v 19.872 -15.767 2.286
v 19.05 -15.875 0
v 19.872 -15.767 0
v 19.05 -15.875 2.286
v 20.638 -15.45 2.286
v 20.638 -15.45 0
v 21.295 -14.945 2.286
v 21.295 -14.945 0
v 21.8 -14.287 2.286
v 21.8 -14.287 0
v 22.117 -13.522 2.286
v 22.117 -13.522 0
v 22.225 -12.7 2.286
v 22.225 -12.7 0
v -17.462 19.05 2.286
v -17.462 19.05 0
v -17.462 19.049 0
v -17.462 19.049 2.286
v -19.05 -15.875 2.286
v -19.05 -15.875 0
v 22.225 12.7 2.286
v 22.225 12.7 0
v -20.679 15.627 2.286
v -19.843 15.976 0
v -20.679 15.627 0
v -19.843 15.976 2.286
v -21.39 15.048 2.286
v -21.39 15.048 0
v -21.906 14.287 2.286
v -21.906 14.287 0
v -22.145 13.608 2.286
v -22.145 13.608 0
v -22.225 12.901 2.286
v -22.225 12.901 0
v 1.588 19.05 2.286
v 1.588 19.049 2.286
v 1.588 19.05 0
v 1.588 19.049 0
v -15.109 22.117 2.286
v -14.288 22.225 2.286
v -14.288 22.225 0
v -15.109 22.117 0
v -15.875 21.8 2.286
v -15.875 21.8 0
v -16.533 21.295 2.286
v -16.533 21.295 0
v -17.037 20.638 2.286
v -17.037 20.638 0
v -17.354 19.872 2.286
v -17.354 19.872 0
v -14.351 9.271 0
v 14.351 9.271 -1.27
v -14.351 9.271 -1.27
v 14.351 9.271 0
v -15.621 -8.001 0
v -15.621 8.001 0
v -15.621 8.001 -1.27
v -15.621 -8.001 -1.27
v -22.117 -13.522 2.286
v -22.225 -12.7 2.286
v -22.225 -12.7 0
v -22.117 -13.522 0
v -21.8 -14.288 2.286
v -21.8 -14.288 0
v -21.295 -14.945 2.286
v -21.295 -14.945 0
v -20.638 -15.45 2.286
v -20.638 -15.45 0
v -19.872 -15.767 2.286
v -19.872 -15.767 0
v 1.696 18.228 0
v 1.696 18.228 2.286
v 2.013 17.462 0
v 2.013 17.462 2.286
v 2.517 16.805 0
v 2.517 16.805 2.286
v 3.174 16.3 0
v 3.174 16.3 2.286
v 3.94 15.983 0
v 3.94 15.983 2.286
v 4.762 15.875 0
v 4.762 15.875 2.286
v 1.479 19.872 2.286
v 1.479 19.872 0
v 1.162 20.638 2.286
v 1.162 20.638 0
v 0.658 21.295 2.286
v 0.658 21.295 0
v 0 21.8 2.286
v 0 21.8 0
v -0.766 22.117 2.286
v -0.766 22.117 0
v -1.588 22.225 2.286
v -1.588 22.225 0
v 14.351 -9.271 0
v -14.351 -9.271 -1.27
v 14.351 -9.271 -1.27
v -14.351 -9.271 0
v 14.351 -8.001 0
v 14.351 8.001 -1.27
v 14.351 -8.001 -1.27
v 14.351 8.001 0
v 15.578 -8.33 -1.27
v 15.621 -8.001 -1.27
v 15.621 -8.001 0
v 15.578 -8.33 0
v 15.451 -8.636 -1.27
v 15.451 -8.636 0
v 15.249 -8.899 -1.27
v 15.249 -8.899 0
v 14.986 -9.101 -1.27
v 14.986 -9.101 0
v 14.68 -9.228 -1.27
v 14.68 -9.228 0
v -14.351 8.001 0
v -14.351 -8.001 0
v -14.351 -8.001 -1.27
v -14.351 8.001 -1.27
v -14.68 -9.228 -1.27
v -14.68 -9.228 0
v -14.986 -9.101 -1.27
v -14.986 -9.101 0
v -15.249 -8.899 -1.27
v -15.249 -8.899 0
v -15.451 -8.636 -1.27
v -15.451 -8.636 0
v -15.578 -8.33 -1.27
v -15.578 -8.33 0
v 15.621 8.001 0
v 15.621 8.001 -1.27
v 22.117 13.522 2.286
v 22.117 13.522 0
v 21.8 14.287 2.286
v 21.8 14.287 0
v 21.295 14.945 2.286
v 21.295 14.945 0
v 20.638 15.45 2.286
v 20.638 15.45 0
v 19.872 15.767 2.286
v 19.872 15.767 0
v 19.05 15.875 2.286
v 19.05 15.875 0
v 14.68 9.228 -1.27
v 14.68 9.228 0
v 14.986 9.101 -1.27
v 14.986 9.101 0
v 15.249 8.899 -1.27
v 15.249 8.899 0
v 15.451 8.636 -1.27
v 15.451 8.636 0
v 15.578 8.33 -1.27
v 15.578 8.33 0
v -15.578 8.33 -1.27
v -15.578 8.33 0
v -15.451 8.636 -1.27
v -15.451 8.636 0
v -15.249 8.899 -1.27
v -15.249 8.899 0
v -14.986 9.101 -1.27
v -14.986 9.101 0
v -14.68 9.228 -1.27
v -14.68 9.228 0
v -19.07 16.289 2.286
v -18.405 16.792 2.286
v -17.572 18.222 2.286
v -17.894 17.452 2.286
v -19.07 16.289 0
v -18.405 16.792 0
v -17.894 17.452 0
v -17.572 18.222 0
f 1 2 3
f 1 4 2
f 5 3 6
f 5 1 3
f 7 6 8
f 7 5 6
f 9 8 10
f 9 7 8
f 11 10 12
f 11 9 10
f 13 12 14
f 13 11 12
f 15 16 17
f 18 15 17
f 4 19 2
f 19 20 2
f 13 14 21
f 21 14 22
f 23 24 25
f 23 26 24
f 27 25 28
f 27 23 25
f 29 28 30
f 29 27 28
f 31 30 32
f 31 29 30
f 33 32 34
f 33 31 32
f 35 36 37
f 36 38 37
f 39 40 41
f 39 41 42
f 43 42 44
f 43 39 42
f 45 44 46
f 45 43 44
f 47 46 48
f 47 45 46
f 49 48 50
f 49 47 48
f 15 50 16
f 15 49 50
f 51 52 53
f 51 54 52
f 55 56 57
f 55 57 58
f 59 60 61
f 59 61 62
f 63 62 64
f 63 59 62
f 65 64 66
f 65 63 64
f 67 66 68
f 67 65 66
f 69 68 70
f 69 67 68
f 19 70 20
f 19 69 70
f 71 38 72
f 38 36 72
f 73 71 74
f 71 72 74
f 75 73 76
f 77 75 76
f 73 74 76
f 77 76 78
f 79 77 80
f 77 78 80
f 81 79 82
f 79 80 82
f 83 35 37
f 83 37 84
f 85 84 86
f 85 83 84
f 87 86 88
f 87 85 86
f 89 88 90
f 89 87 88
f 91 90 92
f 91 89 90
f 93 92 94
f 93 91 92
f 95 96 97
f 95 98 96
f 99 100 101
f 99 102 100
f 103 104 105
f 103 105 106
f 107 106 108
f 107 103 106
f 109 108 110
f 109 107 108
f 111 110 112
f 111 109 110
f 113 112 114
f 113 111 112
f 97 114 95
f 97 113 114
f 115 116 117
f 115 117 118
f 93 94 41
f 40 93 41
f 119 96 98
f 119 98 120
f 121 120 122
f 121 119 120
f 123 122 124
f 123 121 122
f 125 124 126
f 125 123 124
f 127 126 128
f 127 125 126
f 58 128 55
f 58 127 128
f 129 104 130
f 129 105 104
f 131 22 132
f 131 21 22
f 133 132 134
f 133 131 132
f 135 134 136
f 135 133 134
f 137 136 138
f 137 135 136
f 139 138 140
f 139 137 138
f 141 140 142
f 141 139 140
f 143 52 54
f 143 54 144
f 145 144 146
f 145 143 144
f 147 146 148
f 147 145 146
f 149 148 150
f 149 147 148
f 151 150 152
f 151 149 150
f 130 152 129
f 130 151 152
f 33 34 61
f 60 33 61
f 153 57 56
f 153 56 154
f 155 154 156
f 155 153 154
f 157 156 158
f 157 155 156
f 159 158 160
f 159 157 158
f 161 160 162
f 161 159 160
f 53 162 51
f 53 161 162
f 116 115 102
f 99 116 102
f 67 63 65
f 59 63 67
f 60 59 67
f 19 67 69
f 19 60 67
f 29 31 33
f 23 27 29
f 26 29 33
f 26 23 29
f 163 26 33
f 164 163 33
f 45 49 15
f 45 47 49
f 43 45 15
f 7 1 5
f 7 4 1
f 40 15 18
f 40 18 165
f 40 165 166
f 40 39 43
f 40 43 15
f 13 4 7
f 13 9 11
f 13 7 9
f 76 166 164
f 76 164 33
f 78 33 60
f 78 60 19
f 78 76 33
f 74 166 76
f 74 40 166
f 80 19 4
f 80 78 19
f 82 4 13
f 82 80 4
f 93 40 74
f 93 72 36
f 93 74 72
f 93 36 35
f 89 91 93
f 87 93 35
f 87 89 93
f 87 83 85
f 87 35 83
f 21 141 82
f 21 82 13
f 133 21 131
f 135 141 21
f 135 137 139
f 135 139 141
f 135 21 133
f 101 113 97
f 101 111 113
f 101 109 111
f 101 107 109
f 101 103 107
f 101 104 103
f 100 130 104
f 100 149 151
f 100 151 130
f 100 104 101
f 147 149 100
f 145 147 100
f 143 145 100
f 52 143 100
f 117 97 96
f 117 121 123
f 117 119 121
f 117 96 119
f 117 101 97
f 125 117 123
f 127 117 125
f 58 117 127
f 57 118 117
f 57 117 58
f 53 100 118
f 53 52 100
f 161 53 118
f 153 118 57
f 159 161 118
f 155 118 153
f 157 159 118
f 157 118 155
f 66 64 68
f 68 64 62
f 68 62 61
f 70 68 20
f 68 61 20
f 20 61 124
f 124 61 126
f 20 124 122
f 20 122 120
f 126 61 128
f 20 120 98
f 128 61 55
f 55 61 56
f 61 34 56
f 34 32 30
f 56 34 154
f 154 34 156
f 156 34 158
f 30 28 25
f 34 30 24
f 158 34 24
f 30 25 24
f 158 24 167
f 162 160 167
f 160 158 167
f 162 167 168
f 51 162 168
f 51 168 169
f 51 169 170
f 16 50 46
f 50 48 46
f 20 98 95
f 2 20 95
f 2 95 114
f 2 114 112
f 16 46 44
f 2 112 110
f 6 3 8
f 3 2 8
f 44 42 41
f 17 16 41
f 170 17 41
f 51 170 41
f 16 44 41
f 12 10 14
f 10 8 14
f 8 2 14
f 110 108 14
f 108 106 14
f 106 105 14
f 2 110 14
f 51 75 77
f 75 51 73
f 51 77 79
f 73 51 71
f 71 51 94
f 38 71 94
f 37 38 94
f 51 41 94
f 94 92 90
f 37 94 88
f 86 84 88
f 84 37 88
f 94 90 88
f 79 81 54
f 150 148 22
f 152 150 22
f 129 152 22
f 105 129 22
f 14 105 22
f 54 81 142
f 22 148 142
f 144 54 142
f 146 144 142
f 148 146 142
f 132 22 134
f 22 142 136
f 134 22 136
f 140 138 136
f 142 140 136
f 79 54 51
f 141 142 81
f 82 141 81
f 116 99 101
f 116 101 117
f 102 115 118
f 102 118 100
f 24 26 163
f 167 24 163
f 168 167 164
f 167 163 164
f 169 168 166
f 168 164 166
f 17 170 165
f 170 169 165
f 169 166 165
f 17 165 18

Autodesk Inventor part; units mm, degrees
ref_plane "YZ Plane" through (0, 0, 0) normal (1, 0, 0) x (0, 1, 0)
ref_plane "XZ Plane" through (0, 0, 0) normal (0, 1, 0) x (-1, 0, 0)
ref_plane "XY Plane" through (0, 0, 0) normal (0, 0, 1) x (1, 0, 0)
sketch "Sketch4" plane through (0, 0, 0) normal (0, 0, 1) x (1, 0, 0)
  line L0 (15.875, 9.525) -> (15.875, -9.525)
  line L1 (15.875, -9.525) -> (-15.875, -9.525)
  line L2 (-15.875, -9.525) -> (-15.875, 9.525)
  line L3 (-15.875, 9.525) -> (-11.1125, 9.525)
  line L4 (-11.1125, 9.525) -> (-11.1125, 15.875)
  line L5 (-11.1125, 15.875) -> (-4.7625, 15.875)
  line L6 (-4.7625, 15.875) -> (-4.7625, 9.525)
  line L7 (-4.7625, 9.525) -> (15.875, 9.525)
  line L8 (1.5875, 22.225) -> (-17.4625, 22.225)
  line L9 (-17.4625, 22.225) -> (-17.4625, 15.875)
  line L10 (-17.4625, 15.875) -> (-22.225, 15.875)
  line L11 (-22.225, 15.875) -> (-22.225, -15.875)
  line L12 (-22.225, -15.875) -> (22.225, -15.875)
  line L13 (22.225, -15.875) -> (22.225, 15.875)
  line L14 (22.225, 15.875) -> (1.5875, 15.875)
  line L15 (1.5875, 15.875) -> (1.5875, 22.225)
  circle A0 centre (-14.2875, 19.05) radius 1.7145
  circle A1 centre (-1.5875, 19.05) radius 1.7145
  circle A2 centre (-1.5875, 12.7) radius 1.7145
  circle A3 centre (7.9375, 12.7) radius 1.7145
  circle A4 centre (19.05, 12.7) radius 1.7145
  circle A5 centre (19.05, 0) radius 1.7145
  circle A6 centre (19.05, -12.7) radius 1.7145
  circle A7 centre (-19.05, 0) radius 1.7145
  circle A8 centre (-19.05, -12.7) radius 1.7145
  circle A9 centre (-9.525, -12.7) radius 1.7145
  circle A10 centre (0, -12.7) radius 1.7145
  circle A11 centre (9.525, -12.7) radius 1.7145
  circle A12 centre (-19.05, 12.7) radius 1.7145
  point P0 (0, 0)
  dimension "d95" = 3.429
  dimension "d96" = 3.429
  dimension "d97" = 3.429
  dimension "d98" = 3.429
  dimension "d99" = 3.429
  dimension "d100" = 3.429
  dimension "d101" = 3.429
  dimension "d102" = 3.429
  dimension "d103" = 3.429
  dimension "d104" = 3.429
  dimension "d105" = 3.429
  dimension "d106" = 3.429
  dimension "d107" = 3.175
  dimension "d108" = 3.175
  dimension "d109" = 3.175
  dimension "d110" = 3.175
  dimension "d111" = 3.175
  dimension "d112" = 3.175
  dimension "d113" = 9.525
  dimension "d114" = 9.525
  dimension "d115" = 9.525
  dimension "d116" = 9.525
  dimension "d117" = 3.429
  dimension "d118" = 3.175
  dimension "d119" = 3.175
extrude "Extrusion4" add sketch "Sketch4" along normal blind 2.286 contours L0 L1 L2 L3 L4 L5 L6 L7 | L15 L14 L13 L12 L11 L10 L9 L8 | A0 | A1 | A2 | A3 | A4 | A5 | A6 | A7 | A8 | A9 | A10 | A11 | A12
fillet "Fillet3" radius 3.175 8 edges at (-17.4625, 22.225, 1.143) (1.5875, 22.225, 1.143) (1.5875, 15.875, 1.143) (-17.4625, 15.875, 1.143) (-22.225, 15.875, 1.143) (22.225, 15.875, 1.143) (22.225, -15.875, 1.143) (-22.225, -15.875, 1.143)
sketch "Sketch5" plane through (0, 0, 0) normal (0, 0, -1) x (-1, 0, 0)
  arc A0 (19.05, -15.875) -> (22.225, -12.7) centre (19.05, -12.7) ccw construction
  line L0 (22.225, -12.7) -> (22.225, 12.9016) construction
  arc A1 (22.225, 12.9016) -> (19.8438, 15.9758) centre (19.05, 12.9016) ccw construction
  arc A2 (17.4625, 19.05) -> (19.8438, 15.9758) centre (20.6375, 19.05) ccw construction
  arc A3 (17.4625, 19.05) -> (14.2875, 22.225) centre (14.2875, 19.05) ccw construction
  line L1 (14.2875, 22.225) -> (1.5875, 22.225) construction
  arc A4 (1.5875, 22.225) -> (-1.5875, 19.05) centre (1.5875, 19.05) ccw construction
  arc A5 (-4.7625, 15.875) -> (-1.5875, 19.05) centre (-4.7625, 19.05) ccw construction
  line L2 (-4.7625, 15.875) -> (-19.05, 15.875) construction
  arc A6 (-19.05, 15.875) -> (-22.225, 12.7) centre (-19.05, 12.7) ccw construction
  line L3 (-22.225, 12.7) -> (-22.225, -12.7) construction
  arc A7 (-22.225, -12.7) -> (-19.05, -15.875) centre (-19.05, -12.7) ccw construction
  line L4 (-19.05, -15.875) -> (19.05, -15.875) construction
  line L5 (-15.621, 9.271) -> (15.621, 9.271)
  line L6 (15.621, 9.271) -> (15.621, -9.271)
  line L7 (15.621, -9.271) -> (-15.621, -9.271)
  line L8 (-15.621, -9.271) -> (-15.621, 9.271)
  line L9 (14.351, 8.001) -> (-14.351, 8.001)
  line L10 (-14.351, 8.001) -> (-14.351, -8.001)
  line L11 (-14.351, -8.001) -> (14.351, -8.001)
  line L12 (14.351, -8.001) -> (14.351, 8.001)
  point P0 (0, 0)
  dimension "d126" = 6.604
  dimension "d127" = 6.604
  dimension "d128" = 6.604
  dimension "d129" = 6.604
  dimension "d130" = 1.27
extrude "Extrusion5" add sketch "Sketch5" along normal blind 1.27
fillet "Fillet4" radius 1.27 4 edges at (-15.621, 9.271, -0.635) (-15.621, -9.271, -0.635) (15.621, -9.271, -0.635) (15.621, 9.271, -0.635)
equation "\"d95\" = d117"
equation "\"d96\" = d117"
equation "\"d97\" = d117"
equation "\"d98\" = d117"
equation "\"d99\" = d117"
equation "\"d100\" = d117"
equation "\"d101\" = d117"
equation "\"d102\" = d117"
equation "\"d103\" = d117"
equation "\"d104\" = d117"
equation "\"d105\" = d117"
equation "\"d106\" = d117"
equation "\"d115\" = d114"
equation "\"d116\" = d114"
properties part number "foreElectronicsSealingWallFrontCap" material "ABS Plastic"
